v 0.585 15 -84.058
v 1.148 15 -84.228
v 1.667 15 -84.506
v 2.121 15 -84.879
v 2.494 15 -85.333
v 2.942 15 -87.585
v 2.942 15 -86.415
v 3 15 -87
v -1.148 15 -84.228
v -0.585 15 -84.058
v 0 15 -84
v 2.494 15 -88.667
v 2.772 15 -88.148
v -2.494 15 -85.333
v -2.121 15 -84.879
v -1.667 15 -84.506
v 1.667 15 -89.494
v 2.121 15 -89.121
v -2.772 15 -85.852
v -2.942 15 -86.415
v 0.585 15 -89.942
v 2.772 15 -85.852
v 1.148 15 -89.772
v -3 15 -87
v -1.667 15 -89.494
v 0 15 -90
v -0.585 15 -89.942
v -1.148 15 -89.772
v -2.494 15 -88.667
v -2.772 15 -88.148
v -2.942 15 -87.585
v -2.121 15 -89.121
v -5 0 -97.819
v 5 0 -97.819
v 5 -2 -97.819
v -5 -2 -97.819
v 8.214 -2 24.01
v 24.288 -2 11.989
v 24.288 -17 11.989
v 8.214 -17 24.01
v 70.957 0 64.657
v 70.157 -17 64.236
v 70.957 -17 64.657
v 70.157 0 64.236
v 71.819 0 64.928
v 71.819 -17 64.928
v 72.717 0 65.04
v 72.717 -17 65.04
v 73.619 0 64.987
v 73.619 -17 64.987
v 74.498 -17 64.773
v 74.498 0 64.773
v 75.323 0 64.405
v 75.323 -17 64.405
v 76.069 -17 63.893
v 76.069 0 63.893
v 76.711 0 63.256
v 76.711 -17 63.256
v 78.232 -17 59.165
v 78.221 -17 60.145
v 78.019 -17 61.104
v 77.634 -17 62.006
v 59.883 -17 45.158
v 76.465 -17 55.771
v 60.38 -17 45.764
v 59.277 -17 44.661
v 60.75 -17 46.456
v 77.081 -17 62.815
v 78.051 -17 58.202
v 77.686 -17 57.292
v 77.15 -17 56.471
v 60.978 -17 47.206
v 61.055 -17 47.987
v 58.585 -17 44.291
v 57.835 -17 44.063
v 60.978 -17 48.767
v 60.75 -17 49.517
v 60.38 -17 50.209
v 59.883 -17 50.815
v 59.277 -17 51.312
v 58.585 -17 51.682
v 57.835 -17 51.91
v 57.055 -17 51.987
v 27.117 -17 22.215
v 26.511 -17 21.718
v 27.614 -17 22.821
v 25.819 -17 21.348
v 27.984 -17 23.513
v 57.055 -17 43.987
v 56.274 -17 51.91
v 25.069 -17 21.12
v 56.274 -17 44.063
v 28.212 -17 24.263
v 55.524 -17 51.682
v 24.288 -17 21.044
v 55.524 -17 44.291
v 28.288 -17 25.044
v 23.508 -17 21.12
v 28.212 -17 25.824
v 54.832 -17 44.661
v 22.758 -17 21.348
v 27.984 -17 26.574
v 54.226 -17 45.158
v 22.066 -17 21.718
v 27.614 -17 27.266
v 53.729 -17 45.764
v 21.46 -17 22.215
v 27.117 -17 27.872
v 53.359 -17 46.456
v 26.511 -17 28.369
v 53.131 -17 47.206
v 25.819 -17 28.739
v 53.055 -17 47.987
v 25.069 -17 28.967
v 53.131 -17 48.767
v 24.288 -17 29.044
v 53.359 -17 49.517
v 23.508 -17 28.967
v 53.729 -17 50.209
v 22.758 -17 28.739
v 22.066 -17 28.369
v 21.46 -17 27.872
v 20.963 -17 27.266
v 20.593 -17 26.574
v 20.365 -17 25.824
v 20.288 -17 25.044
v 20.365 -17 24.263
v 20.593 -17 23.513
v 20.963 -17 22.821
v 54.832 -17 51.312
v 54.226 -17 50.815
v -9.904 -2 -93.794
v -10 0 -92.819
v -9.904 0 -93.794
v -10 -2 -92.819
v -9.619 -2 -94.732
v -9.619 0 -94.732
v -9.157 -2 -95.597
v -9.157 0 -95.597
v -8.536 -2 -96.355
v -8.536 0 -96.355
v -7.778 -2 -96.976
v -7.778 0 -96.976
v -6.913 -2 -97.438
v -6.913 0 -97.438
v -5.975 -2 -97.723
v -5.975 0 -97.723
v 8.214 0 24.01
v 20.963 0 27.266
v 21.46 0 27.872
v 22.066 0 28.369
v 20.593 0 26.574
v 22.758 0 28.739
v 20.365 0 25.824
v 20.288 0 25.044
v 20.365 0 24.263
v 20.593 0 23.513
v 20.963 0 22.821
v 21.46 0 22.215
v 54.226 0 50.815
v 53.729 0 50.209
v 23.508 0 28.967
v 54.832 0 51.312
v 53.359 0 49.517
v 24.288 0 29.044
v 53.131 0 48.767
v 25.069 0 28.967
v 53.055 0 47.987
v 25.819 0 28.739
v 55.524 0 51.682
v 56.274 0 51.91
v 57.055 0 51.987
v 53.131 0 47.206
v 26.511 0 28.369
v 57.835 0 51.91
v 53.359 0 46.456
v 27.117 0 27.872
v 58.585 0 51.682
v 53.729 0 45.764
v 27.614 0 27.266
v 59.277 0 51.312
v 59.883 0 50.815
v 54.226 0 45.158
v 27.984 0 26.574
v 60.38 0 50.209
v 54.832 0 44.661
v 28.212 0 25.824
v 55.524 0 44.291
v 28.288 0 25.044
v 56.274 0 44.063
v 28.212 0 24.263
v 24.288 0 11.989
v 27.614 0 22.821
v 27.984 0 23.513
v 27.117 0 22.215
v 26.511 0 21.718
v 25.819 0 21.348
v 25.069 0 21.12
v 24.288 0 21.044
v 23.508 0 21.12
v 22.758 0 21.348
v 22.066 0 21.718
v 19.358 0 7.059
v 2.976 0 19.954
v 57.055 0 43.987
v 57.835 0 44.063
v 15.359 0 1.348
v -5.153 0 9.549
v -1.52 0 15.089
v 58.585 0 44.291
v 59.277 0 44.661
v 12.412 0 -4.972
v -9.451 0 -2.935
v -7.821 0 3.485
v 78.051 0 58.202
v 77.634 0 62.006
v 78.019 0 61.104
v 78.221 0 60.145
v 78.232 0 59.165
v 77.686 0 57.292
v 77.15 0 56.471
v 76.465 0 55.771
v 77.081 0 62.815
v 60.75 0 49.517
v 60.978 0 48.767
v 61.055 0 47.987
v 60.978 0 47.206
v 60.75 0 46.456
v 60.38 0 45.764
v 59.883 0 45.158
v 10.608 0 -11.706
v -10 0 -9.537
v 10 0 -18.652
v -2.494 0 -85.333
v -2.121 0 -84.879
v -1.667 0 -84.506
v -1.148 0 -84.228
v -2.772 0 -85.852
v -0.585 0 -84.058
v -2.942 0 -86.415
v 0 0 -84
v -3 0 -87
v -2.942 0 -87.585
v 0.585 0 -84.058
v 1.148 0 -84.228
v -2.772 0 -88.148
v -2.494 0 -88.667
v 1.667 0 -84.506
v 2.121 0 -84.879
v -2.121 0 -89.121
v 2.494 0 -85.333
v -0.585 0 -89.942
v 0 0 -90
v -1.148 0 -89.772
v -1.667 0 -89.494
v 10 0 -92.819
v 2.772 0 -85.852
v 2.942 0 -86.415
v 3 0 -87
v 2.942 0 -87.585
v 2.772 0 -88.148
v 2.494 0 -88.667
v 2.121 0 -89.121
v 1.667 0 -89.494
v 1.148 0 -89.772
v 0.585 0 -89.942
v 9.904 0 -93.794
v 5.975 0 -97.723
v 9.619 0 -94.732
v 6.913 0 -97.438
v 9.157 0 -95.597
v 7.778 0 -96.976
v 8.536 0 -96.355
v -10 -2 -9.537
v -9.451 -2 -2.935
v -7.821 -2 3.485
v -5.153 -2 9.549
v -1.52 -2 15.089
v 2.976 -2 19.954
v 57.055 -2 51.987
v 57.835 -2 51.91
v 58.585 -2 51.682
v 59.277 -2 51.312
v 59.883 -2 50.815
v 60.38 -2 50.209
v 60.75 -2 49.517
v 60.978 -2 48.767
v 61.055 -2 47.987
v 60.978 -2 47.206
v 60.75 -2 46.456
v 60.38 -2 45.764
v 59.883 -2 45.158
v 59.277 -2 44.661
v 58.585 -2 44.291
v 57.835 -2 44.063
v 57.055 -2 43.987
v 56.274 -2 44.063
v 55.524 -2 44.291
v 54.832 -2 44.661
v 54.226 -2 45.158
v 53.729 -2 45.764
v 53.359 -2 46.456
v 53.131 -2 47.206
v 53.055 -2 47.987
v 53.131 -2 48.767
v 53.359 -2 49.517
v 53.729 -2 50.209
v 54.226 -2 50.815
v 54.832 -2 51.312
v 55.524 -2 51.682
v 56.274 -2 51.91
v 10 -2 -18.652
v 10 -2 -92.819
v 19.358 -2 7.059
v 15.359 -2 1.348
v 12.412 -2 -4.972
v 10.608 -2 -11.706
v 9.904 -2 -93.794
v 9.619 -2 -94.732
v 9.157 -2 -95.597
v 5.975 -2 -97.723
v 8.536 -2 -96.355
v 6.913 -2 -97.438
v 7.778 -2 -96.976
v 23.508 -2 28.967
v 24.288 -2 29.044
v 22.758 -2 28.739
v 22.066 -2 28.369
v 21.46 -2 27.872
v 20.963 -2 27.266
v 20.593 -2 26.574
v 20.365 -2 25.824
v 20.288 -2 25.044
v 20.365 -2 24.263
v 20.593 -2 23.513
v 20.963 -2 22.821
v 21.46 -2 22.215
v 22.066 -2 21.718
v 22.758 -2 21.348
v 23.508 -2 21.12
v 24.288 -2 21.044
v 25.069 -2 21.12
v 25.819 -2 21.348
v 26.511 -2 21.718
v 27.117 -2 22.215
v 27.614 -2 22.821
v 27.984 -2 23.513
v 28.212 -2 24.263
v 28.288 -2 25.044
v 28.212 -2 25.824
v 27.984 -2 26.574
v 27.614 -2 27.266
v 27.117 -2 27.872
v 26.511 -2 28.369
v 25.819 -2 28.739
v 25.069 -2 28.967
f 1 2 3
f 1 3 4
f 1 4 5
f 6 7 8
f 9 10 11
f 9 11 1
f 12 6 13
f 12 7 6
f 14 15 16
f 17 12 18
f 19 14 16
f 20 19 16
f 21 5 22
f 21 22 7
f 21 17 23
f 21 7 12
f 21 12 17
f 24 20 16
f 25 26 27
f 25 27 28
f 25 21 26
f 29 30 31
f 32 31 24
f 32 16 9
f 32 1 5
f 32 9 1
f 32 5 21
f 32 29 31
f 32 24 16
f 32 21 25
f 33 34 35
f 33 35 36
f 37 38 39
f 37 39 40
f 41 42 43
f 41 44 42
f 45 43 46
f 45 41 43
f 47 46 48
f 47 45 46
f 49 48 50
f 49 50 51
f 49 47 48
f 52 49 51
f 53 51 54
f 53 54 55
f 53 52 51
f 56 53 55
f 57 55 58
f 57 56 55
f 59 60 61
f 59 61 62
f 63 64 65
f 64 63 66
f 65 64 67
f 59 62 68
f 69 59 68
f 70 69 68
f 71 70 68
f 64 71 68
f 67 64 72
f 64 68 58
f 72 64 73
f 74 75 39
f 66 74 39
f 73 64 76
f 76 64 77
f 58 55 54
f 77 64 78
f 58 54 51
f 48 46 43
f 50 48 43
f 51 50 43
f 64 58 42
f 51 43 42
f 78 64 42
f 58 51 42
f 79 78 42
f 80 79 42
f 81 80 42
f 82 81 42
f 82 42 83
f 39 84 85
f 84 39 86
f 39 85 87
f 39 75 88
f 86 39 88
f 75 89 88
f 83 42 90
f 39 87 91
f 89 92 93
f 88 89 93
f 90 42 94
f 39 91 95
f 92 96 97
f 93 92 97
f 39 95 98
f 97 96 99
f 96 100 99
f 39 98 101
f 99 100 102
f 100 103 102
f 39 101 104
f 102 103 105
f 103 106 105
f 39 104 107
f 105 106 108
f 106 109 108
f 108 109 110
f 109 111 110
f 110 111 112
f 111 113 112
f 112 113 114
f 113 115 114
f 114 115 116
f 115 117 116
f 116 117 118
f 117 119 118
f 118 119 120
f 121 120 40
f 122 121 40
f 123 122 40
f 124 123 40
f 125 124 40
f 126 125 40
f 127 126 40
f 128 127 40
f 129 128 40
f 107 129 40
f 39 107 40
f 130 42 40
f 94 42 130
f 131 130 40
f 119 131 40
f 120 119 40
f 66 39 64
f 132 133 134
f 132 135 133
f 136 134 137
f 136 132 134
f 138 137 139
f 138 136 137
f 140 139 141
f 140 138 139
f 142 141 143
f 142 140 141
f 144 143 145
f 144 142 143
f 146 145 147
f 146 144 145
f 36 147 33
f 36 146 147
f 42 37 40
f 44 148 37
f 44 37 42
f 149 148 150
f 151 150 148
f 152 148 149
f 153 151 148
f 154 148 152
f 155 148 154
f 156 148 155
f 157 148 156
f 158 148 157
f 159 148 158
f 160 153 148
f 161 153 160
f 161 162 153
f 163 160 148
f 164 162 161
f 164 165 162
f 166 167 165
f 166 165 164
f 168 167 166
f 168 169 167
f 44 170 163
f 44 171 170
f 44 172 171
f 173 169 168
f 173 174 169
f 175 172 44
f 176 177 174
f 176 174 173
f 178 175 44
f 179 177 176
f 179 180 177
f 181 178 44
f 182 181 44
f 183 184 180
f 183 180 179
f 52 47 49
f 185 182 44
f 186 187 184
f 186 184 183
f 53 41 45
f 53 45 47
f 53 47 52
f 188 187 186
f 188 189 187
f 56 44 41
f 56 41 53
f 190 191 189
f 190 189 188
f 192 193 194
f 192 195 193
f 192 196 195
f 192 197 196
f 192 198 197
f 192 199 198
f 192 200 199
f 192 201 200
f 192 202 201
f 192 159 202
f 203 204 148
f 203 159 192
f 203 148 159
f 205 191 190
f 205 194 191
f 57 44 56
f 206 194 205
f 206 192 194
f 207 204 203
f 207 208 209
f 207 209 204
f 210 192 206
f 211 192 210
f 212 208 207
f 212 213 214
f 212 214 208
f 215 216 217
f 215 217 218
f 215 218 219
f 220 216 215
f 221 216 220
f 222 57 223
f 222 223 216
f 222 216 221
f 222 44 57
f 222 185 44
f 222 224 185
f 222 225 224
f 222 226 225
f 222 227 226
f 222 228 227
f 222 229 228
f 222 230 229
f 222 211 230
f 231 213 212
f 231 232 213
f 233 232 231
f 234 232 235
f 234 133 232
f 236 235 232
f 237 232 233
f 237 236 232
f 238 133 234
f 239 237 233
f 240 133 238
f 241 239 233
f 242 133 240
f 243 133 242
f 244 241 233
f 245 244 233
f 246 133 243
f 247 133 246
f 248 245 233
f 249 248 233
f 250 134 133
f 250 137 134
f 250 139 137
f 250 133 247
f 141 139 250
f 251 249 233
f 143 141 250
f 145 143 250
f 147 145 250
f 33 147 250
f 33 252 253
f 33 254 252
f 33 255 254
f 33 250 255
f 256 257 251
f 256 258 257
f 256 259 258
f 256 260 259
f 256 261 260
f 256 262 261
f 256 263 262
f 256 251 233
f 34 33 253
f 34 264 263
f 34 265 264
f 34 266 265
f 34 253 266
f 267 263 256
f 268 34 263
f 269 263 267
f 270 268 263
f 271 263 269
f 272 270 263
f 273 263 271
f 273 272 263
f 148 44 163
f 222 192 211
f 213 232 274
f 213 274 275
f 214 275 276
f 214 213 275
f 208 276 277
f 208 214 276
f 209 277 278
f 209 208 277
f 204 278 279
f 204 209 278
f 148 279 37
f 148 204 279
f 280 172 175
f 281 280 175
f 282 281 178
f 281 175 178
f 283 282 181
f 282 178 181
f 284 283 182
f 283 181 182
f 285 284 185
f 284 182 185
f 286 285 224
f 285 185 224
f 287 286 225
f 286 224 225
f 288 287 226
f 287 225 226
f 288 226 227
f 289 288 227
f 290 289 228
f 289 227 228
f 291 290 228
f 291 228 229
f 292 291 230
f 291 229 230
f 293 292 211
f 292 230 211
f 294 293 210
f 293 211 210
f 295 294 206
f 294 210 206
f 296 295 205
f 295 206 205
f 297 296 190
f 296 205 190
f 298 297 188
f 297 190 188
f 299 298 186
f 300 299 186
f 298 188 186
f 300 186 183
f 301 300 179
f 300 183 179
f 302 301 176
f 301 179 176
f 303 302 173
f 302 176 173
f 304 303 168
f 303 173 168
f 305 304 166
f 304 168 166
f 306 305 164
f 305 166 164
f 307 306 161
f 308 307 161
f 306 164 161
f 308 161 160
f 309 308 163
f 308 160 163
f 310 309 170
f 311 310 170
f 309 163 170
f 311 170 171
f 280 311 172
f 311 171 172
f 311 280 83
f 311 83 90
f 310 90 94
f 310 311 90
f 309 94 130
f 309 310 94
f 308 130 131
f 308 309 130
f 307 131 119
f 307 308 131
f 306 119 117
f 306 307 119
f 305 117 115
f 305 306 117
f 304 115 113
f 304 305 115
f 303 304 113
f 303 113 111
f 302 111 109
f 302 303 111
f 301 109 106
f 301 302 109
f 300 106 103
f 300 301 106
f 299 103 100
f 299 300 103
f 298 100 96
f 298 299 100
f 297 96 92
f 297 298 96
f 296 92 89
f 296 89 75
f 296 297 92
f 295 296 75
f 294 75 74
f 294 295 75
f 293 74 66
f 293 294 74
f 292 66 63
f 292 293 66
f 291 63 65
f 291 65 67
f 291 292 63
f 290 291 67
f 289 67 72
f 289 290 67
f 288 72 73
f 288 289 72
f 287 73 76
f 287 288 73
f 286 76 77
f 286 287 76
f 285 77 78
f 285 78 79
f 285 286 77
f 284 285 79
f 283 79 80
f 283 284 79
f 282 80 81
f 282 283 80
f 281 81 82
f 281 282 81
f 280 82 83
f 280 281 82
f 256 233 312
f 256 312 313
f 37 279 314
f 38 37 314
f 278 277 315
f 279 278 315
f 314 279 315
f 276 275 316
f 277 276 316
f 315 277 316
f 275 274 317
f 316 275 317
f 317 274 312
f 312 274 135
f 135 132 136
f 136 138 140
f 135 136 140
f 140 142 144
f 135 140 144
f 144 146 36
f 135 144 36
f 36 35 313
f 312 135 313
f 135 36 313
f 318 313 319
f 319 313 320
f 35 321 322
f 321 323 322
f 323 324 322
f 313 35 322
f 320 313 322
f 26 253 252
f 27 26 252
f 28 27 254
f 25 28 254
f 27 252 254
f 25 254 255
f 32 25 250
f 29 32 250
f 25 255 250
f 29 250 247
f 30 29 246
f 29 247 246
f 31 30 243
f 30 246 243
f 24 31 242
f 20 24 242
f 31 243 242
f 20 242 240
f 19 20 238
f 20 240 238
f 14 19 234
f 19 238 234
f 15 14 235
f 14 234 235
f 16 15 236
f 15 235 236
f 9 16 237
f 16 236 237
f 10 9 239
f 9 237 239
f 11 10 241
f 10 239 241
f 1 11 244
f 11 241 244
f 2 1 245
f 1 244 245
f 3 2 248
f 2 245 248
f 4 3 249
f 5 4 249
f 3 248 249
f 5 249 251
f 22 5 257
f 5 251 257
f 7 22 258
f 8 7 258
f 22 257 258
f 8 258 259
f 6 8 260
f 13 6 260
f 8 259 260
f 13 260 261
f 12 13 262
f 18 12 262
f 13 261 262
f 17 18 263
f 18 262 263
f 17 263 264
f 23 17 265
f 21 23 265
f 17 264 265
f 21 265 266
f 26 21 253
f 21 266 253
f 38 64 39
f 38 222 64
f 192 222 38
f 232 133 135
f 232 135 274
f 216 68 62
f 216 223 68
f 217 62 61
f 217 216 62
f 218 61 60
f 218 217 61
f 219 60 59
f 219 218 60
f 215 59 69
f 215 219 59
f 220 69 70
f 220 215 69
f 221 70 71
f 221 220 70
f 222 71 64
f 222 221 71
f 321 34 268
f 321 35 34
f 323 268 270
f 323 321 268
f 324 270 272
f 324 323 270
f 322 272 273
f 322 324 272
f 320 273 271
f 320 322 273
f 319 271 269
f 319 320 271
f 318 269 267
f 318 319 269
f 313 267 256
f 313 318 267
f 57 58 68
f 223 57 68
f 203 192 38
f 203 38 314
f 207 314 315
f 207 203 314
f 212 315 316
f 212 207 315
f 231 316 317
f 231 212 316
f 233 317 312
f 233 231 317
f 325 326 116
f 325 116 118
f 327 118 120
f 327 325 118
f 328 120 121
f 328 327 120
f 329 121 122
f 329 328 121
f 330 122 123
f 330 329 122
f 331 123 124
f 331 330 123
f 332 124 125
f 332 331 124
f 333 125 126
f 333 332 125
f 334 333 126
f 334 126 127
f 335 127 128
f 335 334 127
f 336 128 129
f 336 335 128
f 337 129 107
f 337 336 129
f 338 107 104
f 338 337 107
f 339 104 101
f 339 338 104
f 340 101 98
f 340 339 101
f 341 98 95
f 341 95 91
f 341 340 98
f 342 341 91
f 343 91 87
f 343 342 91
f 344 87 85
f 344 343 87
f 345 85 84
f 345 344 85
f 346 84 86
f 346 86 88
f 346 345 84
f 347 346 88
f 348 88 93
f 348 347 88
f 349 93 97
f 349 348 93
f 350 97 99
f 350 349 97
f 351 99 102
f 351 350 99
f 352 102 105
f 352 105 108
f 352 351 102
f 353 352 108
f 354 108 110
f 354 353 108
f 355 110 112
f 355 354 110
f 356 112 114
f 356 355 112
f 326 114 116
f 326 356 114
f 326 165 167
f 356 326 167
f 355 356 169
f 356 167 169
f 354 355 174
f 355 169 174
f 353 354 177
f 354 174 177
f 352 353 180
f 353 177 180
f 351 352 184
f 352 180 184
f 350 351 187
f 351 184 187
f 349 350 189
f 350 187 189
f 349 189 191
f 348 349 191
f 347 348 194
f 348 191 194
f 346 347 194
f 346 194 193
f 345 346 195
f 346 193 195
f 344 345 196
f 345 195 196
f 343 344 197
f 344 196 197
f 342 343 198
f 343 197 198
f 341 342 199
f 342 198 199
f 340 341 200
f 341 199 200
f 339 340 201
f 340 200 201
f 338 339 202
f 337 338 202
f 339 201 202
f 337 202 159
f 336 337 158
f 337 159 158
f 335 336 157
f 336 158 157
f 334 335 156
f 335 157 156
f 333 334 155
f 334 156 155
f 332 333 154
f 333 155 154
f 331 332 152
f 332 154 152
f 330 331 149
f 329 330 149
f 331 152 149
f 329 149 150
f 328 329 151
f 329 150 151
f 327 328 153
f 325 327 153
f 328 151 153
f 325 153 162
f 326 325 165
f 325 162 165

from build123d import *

# Parameters (mm, degrees)
SKETCH1_R           = 4
BASE_FLANGE1_DEPTH  = 2
SKETCH6_R           = 4
BOSS_EXTRUDE1_DEPTH = 15
SKETCH7_R           = 3
BOSS_EXTRUDE2_DEPTH = 15
FILLET2_R           = 5


# Sheet-metal steps are written as plain solids
with BuildPart() as part:
    # Sketch1 → Base-Flange1 (new body)
    with BuildSketch(Plane(origin=(0, 0, 0), x_dir=(1, 0, 0), z_dir=(0, 1, 0))):
        with BuildLine():
            Line((8.214438599, -24.009587925), (73.867056795, -66.644896694))
            Line((73.867056795, -66.644896694), (80.294932891, -58.984452263))
            Line((80.294932891, -58.984452263), (24.288495613, -11.989471399))
            ThreePointArc((24.288495613, -11.989471399), (13.747688519, 1.747575857), (10, 18.652306326))
            Line((10, 18.652306326), (10, 97.819006808))
            Line((10, 97.819006808), (-10, 97.819006808))
            Line((-10, 97.819006808), (-10, 9.537234793))
            ThreePointArc((-10, 9.537234793), (-5.152684506, -9.549115617), (8.214438599, -24.009587925))
        make_face()
        with Locations(Location((24.288495613, -25.043544292, 0), (0, 0, 270))):
            Circle(SKETCH1_R, mode=Mode.SUBTRACT)
        with Locations(Location((57.054577384, -47.986601746, 0), (0, 0, 270))):
            Circle(SKETCH1_R, mode=Mode.SUBTRACT)
    extrude(amount=-BASE_FLANGE1_DEPTH)

    # Sketch6 → Boss-Extrude1 (add)
    with BuildSketch(Plane.XZ.offset(2)):
        Polygon((8.214438599, 24.009587925), (73.867056795, 66.644896694), (80.294932891, 58.984452263), (24.288495613, 11.989471399), align=None)
        with Locations(Location((24.288495613, 25.043544292, 0), (0, 0, 90))):
            Circle(SKETCH6_R, mode=Mode.SUBTRACT)
        with Locations(Location((57.054577384, 47.986601746, 0), (0, 0, 90))):
            Circle(SKETCH6_R, mode=Mode.SUBTRACT)
    extrude(amount=BOSS_EXTRUDE1_DEPTH)

    # Sketch7 → Boss-Extrude2 (add)
    with BuildSketch(Plane(origin=(0, 0, 0), x_dir=(1, 0, 0), z_dir=(0, 1, 0))):
        with Locations(Location((0, 87, 0), (0, 0, 90))):
            Circle(SKETCH7_R)
    extrude(amount=BOSS_EXTRUDE2_DEPTH)

    # Fillet2
    fillet2_edges = [part.edges().sort_by_distance(p)[0] for p in [
        (73.867056795, -8.5, 66.644896694),
        (-10, -1, -97.819006808),
        (10, -1, -97.819006808),
        (80.294932891, -8.5, 58.984452263),
    ]]
    fillet(fillet2_edges, radius=FILLET2_R)


solid = part.part
